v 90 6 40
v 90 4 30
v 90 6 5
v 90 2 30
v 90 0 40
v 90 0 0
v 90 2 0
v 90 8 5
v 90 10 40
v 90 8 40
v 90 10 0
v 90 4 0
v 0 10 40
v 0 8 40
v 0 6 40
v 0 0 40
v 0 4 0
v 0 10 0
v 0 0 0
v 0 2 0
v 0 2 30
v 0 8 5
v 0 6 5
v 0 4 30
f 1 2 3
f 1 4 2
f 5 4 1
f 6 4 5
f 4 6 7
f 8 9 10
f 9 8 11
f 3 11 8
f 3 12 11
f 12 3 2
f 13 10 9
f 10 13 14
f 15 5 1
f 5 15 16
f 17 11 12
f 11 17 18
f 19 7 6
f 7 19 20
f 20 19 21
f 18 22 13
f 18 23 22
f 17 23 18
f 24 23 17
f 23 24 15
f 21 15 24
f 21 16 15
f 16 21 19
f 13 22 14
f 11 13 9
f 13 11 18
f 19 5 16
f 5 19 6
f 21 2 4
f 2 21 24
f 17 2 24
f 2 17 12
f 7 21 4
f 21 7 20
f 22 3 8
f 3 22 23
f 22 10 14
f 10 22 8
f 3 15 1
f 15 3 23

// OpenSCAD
difference()
{
    cube([90,10,40]);
    translate([-5,2,-5]) cube([100,2,35]);
    translate([-5,6,5]) cube([100,2,35]);
}
